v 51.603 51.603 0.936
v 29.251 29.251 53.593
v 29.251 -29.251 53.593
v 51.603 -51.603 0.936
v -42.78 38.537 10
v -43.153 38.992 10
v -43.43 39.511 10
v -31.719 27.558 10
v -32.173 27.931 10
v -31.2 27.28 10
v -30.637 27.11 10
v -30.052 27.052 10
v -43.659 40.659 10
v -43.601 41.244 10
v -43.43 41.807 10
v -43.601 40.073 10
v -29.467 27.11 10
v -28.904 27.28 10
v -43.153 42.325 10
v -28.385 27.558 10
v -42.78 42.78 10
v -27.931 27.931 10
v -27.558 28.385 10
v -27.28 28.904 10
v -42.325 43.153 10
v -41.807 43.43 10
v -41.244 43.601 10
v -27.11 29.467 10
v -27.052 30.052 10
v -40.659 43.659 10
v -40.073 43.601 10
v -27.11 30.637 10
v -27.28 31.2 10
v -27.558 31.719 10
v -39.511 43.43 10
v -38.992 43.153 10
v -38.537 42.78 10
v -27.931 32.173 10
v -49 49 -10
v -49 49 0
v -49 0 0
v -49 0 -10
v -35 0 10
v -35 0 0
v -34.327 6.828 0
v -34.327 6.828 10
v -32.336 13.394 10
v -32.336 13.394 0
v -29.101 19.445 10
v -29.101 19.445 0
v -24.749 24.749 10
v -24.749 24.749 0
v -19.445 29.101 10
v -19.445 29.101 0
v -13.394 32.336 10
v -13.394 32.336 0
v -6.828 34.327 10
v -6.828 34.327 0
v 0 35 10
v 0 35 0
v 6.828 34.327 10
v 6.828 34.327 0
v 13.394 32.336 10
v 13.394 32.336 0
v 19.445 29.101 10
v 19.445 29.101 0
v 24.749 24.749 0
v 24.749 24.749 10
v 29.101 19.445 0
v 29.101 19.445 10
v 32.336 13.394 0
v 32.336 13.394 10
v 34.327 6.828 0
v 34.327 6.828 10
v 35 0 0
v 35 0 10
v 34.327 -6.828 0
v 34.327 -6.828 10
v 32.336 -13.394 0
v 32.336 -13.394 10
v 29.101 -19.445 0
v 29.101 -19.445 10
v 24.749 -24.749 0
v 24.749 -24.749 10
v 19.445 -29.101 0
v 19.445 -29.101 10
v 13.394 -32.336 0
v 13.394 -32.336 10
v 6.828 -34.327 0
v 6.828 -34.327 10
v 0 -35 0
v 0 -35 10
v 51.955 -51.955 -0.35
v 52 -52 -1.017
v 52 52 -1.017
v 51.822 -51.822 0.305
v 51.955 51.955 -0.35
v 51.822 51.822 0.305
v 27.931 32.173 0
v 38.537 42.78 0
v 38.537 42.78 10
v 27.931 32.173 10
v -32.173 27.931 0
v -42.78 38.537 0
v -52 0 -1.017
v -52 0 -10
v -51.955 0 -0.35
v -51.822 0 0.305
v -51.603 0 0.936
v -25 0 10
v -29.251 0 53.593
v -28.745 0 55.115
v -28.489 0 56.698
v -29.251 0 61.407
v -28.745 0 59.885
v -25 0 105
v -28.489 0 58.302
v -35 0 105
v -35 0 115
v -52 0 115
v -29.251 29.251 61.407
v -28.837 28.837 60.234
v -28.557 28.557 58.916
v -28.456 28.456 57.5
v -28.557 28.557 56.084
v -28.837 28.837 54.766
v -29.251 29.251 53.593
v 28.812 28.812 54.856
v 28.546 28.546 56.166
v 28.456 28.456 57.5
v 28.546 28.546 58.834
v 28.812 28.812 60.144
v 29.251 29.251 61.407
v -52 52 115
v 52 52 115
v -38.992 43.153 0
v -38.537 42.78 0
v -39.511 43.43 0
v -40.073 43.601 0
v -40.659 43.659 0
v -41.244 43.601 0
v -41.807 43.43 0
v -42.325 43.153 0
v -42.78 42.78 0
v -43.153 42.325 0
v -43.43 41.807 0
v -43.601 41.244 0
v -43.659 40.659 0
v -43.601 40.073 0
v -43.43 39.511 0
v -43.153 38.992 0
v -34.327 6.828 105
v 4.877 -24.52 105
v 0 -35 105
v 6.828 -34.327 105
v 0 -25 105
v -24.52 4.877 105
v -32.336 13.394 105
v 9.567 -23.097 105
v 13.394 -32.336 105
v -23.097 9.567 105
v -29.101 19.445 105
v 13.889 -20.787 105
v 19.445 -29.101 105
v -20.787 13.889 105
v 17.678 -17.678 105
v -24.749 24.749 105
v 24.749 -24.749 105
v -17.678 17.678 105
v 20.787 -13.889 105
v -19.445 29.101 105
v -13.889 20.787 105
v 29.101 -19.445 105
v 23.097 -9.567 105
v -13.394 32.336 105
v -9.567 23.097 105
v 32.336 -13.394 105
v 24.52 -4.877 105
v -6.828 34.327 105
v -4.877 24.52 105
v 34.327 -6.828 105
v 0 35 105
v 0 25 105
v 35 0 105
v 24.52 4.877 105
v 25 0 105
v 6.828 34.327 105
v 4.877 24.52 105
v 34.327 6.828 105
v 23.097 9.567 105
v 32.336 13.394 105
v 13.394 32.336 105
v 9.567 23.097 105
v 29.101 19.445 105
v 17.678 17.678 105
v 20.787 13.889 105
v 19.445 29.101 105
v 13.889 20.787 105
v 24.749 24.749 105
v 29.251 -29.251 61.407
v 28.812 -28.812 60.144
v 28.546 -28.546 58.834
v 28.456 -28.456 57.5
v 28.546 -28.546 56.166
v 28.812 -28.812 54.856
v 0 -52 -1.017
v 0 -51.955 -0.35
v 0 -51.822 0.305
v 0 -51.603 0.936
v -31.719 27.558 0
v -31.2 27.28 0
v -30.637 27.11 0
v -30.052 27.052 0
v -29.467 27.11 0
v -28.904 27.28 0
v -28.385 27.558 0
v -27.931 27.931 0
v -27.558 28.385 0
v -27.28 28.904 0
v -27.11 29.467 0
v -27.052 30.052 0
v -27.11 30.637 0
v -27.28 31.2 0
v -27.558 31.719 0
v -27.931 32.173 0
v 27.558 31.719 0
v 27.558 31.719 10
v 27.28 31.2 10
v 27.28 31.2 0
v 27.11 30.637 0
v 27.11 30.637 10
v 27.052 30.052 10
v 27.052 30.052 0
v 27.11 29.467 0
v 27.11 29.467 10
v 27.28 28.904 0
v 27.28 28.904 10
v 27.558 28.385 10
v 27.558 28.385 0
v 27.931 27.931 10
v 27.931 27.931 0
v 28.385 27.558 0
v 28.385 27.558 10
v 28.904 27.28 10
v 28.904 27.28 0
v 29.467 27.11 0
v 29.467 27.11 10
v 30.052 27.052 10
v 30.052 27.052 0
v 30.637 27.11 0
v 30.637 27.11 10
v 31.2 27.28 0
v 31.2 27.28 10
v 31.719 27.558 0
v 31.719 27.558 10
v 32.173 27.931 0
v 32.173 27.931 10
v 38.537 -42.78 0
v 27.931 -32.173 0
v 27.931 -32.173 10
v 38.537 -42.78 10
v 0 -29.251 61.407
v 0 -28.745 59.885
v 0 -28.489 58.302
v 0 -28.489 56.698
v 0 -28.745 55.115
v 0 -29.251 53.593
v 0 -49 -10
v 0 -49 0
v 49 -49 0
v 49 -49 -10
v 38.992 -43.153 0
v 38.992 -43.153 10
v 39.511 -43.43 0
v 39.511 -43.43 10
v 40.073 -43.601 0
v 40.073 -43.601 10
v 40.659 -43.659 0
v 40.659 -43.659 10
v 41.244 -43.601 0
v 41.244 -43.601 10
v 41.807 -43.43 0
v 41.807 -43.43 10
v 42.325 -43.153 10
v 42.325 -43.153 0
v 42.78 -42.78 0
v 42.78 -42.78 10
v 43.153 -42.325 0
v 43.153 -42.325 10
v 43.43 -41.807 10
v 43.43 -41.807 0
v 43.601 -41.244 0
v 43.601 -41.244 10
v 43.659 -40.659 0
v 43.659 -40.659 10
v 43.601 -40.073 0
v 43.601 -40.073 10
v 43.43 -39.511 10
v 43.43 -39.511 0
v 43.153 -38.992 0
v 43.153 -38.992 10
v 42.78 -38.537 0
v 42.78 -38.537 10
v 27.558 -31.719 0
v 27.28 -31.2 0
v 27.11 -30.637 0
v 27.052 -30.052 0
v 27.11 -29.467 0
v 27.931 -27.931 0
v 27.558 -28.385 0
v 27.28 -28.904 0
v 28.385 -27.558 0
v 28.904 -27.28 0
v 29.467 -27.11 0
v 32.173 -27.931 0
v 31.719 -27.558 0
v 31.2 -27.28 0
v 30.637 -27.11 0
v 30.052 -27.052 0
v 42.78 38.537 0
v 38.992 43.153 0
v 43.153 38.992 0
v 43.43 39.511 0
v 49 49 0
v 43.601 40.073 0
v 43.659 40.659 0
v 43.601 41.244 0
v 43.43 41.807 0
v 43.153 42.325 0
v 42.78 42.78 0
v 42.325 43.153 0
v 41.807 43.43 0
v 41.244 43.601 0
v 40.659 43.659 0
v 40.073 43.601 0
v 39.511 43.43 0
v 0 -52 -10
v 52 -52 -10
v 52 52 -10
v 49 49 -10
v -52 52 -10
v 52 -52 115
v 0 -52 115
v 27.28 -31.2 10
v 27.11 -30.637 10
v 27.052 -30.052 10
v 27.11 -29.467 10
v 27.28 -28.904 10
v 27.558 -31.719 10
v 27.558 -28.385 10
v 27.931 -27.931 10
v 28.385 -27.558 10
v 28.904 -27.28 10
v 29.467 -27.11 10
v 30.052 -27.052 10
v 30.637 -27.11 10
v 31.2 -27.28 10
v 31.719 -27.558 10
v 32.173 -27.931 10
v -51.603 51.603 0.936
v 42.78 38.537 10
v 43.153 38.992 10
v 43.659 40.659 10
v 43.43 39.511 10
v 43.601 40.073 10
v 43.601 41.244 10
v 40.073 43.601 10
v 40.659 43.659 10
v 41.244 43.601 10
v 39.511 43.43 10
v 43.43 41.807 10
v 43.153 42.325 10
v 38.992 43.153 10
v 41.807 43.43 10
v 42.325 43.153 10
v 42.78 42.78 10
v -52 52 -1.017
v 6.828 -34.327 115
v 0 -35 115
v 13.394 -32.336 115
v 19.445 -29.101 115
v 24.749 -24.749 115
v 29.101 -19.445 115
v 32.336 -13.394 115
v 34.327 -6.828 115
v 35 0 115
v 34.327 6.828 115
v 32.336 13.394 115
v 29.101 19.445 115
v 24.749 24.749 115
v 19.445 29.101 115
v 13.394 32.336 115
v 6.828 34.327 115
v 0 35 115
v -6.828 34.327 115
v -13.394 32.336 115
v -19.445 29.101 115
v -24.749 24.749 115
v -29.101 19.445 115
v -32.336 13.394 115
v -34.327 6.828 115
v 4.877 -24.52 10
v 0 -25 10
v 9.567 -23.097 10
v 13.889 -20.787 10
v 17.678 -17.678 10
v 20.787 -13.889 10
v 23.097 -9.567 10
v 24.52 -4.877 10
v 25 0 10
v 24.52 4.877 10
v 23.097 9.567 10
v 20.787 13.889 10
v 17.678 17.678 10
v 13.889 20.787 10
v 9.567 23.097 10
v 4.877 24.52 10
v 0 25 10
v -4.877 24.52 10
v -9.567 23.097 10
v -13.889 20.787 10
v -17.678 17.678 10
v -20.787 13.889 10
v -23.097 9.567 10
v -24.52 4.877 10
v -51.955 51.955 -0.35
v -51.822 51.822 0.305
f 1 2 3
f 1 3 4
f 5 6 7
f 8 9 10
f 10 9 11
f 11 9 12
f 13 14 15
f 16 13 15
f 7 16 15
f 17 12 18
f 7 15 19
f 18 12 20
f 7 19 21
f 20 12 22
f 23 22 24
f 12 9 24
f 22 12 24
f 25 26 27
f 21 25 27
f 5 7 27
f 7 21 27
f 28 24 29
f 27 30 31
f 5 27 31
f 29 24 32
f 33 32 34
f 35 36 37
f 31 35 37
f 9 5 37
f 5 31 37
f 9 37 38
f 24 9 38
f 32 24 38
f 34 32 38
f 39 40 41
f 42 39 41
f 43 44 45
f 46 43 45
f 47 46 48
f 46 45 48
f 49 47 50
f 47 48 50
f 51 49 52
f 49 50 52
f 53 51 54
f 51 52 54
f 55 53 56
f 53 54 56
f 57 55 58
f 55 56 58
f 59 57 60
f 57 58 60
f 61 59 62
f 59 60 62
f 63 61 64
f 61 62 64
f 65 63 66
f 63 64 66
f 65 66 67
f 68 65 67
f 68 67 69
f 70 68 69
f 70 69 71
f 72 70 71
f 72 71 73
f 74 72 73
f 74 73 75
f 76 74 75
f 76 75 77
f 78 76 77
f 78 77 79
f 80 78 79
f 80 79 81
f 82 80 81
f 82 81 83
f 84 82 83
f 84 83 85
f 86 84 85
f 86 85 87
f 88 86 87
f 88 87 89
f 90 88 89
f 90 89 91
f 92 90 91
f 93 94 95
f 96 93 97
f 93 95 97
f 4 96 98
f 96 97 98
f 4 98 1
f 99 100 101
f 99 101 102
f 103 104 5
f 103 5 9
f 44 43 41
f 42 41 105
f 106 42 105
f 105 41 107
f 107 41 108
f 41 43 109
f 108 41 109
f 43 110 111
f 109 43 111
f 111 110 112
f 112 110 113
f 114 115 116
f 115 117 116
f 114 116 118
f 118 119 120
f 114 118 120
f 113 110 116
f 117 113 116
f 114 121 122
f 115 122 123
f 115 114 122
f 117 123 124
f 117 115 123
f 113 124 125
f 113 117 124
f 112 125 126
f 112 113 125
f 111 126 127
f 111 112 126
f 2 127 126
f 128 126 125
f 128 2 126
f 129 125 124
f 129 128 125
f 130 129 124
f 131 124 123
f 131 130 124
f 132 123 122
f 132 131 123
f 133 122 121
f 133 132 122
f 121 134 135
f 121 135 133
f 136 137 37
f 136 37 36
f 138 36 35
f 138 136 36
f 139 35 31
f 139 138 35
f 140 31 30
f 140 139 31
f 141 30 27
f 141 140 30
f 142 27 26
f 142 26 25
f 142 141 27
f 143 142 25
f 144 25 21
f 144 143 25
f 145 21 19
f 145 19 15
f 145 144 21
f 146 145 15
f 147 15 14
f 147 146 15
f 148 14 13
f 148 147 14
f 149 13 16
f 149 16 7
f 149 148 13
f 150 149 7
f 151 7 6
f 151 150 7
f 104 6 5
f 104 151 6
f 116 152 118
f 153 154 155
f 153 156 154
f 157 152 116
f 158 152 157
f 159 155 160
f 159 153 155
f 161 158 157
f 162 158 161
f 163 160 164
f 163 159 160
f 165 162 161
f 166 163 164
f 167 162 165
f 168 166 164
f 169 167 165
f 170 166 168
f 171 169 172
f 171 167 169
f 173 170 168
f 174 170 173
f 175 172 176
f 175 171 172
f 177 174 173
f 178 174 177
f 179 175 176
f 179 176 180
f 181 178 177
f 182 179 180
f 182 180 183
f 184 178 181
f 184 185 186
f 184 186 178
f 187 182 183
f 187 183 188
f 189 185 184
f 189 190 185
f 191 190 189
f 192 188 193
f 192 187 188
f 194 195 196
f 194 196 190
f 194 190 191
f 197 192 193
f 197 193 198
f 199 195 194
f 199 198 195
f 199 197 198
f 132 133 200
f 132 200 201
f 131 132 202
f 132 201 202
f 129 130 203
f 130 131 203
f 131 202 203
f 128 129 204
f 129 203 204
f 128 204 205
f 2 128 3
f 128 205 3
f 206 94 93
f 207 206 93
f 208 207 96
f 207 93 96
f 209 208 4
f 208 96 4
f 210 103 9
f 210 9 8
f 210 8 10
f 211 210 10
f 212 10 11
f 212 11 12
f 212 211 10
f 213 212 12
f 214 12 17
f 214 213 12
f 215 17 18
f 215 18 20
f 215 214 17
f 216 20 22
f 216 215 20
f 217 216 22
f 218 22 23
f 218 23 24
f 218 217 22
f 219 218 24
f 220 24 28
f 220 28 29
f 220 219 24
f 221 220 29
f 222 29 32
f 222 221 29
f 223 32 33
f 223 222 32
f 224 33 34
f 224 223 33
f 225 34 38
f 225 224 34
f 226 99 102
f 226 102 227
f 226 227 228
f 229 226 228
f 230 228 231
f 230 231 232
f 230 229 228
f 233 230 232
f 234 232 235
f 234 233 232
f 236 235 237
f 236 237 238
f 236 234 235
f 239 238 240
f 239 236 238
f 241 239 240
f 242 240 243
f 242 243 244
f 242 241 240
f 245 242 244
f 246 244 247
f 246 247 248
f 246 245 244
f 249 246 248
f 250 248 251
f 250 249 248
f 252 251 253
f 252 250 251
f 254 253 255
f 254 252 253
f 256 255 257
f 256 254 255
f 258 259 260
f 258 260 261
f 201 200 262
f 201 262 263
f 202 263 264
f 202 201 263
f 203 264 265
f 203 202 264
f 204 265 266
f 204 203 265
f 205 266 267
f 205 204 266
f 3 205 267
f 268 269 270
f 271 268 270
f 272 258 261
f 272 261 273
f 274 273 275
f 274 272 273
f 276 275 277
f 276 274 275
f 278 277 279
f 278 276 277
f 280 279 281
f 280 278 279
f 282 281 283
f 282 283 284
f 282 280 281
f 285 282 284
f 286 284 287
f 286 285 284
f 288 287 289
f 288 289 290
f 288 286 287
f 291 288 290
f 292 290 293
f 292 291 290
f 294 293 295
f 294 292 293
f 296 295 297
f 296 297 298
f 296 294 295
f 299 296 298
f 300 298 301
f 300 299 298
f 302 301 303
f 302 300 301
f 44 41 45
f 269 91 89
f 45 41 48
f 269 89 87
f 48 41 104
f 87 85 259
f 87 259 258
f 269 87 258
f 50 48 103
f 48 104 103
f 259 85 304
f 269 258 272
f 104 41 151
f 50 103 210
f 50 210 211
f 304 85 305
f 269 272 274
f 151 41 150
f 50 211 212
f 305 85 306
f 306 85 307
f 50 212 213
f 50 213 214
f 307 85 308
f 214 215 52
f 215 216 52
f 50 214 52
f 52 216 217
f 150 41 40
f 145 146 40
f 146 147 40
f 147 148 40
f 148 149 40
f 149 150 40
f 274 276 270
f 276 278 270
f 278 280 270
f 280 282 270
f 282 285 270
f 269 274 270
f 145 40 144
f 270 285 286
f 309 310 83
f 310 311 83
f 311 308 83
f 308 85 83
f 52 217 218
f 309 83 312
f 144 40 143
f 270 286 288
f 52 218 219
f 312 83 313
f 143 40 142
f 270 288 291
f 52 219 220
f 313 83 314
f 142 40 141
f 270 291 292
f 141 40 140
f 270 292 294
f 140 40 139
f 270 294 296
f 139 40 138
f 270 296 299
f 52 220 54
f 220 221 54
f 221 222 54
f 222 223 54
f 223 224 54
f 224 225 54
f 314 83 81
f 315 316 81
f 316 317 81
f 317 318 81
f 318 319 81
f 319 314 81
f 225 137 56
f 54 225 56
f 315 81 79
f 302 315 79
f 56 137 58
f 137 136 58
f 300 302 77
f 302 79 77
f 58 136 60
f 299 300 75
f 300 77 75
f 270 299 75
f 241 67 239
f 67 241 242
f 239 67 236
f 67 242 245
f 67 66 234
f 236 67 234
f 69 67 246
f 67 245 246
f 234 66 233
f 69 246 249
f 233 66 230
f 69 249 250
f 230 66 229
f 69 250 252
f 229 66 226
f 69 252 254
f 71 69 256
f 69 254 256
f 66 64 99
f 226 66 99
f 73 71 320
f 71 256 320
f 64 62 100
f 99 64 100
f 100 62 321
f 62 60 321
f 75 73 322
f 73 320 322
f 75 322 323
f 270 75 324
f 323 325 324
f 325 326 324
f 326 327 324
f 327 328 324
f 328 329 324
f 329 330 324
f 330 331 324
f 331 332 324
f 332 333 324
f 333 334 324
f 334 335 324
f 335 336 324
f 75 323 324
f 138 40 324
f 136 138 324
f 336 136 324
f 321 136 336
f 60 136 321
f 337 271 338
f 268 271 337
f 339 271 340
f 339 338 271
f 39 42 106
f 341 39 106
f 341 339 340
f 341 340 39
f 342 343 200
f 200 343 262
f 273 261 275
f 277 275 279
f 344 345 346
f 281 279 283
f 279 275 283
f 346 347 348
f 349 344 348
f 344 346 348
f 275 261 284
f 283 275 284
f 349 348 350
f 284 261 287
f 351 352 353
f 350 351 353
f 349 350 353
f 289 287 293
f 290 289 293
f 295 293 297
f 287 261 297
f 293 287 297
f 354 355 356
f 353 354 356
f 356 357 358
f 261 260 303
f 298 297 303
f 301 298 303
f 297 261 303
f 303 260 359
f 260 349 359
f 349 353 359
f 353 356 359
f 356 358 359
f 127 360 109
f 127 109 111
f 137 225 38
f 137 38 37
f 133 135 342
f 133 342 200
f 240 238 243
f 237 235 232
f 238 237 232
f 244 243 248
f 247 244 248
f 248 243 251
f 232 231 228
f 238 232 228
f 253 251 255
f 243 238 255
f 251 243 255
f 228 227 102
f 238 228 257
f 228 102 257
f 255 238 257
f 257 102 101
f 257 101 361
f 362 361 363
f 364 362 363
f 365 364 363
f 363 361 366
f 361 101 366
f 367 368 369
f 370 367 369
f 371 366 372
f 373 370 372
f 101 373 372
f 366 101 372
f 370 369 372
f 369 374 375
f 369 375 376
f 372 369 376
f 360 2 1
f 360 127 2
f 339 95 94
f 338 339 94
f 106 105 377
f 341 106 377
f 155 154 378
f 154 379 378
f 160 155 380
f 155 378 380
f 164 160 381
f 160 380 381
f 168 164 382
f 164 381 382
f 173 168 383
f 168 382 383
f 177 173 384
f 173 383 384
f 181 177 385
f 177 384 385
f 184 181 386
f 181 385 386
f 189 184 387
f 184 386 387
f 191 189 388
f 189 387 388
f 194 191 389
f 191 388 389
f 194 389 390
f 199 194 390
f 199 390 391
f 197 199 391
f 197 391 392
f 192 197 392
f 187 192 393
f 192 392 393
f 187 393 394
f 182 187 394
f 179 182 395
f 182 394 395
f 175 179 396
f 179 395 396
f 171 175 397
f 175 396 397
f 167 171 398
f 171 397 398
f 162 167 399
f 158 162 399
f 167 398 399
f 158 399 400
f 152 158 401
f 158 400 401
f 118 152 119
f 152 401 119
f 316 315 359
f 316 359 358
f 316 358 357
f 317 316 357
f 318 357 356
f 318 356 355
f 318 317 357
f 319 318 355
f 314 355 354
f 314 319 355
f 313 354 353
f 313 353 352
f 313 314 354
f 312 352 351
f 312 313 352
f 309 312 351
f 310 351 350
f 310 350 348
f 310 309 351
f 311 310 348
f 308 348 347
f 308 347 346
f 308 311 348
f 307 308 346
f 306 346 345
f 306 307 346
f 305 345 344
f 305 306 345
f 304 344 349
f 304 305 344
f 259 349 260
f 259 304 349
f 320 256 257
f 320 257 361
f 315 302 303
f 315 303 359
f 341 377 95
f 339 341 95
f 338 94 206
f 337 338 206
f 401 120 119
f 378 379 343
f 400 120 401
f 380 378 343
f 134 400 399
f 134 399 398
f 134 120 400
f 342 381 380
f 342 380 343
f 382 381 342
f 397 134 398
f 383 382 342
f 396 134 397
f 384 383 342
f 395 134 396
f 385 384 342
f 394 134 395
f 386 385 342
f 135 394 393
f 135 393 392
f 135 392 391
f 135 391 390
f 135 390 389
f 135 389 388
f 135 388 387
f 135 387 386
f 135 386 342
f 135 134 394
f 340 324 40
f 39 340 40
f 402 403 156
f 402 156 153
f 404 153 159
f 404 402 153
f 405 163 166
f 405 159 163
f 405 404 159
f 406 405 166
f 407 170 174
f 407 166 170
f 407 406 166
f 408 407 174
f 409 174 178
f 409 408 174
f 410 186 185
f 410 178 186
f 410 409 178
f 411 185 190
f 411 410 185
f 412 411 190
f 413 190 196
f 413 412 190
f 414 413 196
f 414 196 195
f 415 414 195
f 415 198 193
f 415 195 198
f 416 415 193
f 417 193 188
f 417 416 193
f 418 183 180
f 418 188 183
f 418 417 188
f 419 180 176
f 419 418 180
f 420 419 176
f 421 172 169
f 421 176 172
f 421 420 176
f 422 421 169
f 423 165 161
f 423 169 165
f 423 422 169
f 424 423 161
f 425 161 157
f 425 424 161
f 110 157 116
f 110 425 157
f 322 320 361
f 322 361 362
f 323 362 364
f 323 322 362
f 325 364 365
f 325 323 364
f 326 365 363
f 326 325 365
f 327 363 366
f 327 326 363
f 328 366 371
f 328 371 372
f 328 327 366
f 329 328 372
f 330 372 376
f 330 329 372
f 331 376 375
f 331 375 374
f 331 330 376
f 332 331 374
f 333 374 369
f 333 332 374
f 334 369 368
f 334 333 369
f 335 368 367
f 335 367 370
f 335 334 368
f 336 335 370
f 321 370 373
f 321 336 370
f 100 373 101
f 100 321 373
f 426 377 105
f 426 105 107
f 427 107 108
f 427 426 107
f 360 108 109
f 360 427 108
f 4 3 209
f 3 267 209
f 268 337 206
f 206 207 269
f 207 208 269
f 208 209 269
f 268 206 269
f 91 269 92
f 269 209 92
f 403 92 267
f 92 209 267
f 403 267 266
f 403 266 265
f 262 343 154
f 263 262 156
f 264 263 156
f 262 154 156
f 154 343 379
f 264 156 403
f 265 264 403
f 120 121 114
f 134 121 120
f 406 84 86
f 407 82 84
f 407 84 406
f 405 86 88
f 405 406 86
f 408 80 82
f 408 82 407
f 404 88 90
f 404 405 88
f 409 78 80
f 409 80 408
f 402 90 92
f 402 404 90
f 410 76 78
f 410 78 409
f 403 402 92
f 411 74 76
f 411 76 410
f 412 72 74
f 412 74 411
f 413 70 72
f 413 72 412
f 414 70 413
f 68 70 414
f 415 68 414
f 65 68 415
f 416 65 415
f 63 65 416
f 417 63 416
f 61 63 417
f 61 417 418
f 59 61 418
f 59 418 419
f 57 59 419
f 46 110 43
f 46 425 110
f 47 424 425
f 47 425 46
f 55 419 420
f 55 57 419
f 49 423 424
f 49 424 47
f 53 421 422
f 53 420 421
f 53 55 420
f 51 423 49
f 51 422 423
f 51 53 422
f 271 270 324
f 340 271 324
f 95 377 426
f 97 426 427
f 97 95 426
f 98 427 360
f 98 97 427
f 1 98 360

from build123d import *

# Parameters (mm, degrees)
SKETCH1_W           = 104
SKETCH1_H           = 104
SKETCH1_R           = 25
BOSS_EXTRUDE1_DEPTH = 115
CUT_EXTRUDE3_DEPTH  = 115
CUT_EXTRUDE4_DEPTH  = 115
CUT_EXTRUDE5_DEPTH  = 116
FILLET1_R           = 10
SKETCH9_R           = 35
CUT_EXTRUDE6_DEPTH  = 10
SKETCH10_R          = 35
CUT_EXTRUDE7_DEPTH  = 10
BOSS_EXTRUDE2_DEPTH = 10
FILLET2_R           = 5
CUT_EXTRUDE8_DEPTH  = 10


with BuildPart() as part:
    # Sketch1 → Boss-Extrude1 (new body)
    with BuildSketch(Plane.XY):
        Rectangle(SKETCH1_W, SKETCH1_H)
        Circle(SKETCH1_R, mode=Mode.SUBTRACT)
    extrude(amount=BOSS_EXTRUDE1_DEPTH)

    # Sketch7 → Cut-Extrude3 (cut)
    with BuildSketch(Plane.ZY.offset(52)):
        Polygon((0, 52), (115, 52), (57.5, 27.592698068), align=None)
        Polygon((0, -52), (115, -52), (57.5, -27.592698068), align=None)
    extrude(amount=-CUT_EXTRUDE3_DEPTH, mode=Mode.SUBTRACT)

    # Sketch4 → Cut-Extrude4 (cut)
    with BuildSketch(Plane(origin=(0, 52, 0), x_dir=(1, 0, 0), z_dir=(0, 1, 0))):
        Polygon((-52, 0), (-27.592698068, -57.5), (-52, -115), align=None)
        Polygon((52, -115), (27.592698068, -57.5), (52, 0), align=None)
    extrude(amount=-CUT_EXTRUDE4_DEPTH, mode=Mode.SUBTRACT)

    # Sketch8 → Cut-Extrude5 (cut, through all)
    with BuildSketch(Plane(origin=(0, 0, 0), x_dir=(-1, 0, 0), z_dir=(0, 0, -1))):
        with BuildLine():
            Line((0, 0), (96.389790508, 0))
            ThreePointArc((96.389790508, 0), (83.425867148, -83.299633305), (0, -95.424686222))
            Line((0, -95.424686222), (0, 0))
        make_face()
    extrude(amount=-CUT_EXTRUDE5_DEPTH, mode=Mode.SUBTRACT)

    # Fillet1
    fillet1_edges = [part.edges().sort_by_distance(p)[0] for p in [
        (13.796349034, -27.592698068, 57.5),
        (0, 27.592698068, 57.5),
        (27.592698068, 0, 57.5),
        (-27.592698068, 13.796349034, 57.5),
    ]]
    fillet(fillet1_edges, radius=FILLET1_R)

    # Sketch9 → Cut-Extrude6 (cut)
    with BuildSketch(Plane(origin=(0, 0, 0), x_dir=(-1, 0, 0), z_dir=(0, 0, -1))):
        Circle(SKETCH9_R)
    extrude(amount=-CUT_EXTRUDE6_DEPTH, mode=Mode.SUBTRACT)

    # Sketch10 → Cut-Extrude7 (cut)
    with BuildSketch(Plane.XY.offset(115)):
        Circle(SKETCH10_R)
    extrude(amount=-CUT_EXTRUDE7_DEPTH, mode=Mode.SUBTRACT)

    # Sketch11 → Boss-Extrude2 (add)
    with BuildSketch(Plane(origin=(0, 0, 0), x_dir=(-1, 0, 0), z_dir=(0, 0, -1))):
        Polygon((52, 0), (52, 52), (-52, 52), (-52, -52), (0, -52), (0, -49), (-49, -49), (-49, 49), (49, 49), (49, 0), align=None)
    extrude(amount=BOSS_EXTRUDE2_DEPTH)

    # Fillet2
    fillet2_edges = [part.edges().sort_by_distance(p)[0] for p in [
        (0, 52, 0),
        (52, 0, 0),
        (-52, 26, 0),
        (26, -52, 0),
    ]]
    fillet(fillet2_edges, radius=FILLET2_R)

    # Sketch12 → Cut-Extrude8 (cut)
    with BuildSketch(Plane(origin=(0, 0, 0), x_dir=(-1, 0, 0), z_dir=(0, 0, -1))):
        with BuildLine():
            Line((27.930717857, 32.173358544), (38.537319575, 42.779960262))
            ThreePointArc((38.537319575, 42.779960262), (42.779960262, 42.779960262), (42.779960262, 38.537319575))
            Line((42.779960262, 38.537319575), (32.173358544, 27.930717857))
            ThreePointArc((32.173358544, 27.930717857), (27.930717857, 27.930717857), (27.930717857, 32.173358544))
        make_face()
        with BuildLine():
            Line((-32.173358544, 27.930717857), (-42.779960262, 38.537319575))
            ThreePointArc((-42.779960262, 38.537319575), (-42.779960262, 42.779960262), (-38.537319575, 42.779960262))
            Line((-38.537319575, 42.779960262), (-27.930717857, 32.173358544))
            ThreePointArc((-27.930717857, 32.173358544), (-27.930717857, 27.930717857), (-32.173358544, 27.930717857))
        make_face()
        with BuildLine():
            Line((-27.930717857, -32.173358544), (-38.537319575, -42.779960262))
            ThreePointArc((-38.537319575, -42.779960262), (-42.779960262, -42.779960262), (-42.779960262, -38.537319575))
            Line((-42.779960262, -38.537319575), (-32.173358544, -27.930717857))
            ThreePointArc((-32.173358544, -27.930717857), (-27.930717857, -27.930717857), (-27.930717857, -32.173358544))
        make_face()
    extrude(amount=-CUT_EXTRUDE8_DEPTH, mode=Mode.SUBTRACT)


solid = part.part
